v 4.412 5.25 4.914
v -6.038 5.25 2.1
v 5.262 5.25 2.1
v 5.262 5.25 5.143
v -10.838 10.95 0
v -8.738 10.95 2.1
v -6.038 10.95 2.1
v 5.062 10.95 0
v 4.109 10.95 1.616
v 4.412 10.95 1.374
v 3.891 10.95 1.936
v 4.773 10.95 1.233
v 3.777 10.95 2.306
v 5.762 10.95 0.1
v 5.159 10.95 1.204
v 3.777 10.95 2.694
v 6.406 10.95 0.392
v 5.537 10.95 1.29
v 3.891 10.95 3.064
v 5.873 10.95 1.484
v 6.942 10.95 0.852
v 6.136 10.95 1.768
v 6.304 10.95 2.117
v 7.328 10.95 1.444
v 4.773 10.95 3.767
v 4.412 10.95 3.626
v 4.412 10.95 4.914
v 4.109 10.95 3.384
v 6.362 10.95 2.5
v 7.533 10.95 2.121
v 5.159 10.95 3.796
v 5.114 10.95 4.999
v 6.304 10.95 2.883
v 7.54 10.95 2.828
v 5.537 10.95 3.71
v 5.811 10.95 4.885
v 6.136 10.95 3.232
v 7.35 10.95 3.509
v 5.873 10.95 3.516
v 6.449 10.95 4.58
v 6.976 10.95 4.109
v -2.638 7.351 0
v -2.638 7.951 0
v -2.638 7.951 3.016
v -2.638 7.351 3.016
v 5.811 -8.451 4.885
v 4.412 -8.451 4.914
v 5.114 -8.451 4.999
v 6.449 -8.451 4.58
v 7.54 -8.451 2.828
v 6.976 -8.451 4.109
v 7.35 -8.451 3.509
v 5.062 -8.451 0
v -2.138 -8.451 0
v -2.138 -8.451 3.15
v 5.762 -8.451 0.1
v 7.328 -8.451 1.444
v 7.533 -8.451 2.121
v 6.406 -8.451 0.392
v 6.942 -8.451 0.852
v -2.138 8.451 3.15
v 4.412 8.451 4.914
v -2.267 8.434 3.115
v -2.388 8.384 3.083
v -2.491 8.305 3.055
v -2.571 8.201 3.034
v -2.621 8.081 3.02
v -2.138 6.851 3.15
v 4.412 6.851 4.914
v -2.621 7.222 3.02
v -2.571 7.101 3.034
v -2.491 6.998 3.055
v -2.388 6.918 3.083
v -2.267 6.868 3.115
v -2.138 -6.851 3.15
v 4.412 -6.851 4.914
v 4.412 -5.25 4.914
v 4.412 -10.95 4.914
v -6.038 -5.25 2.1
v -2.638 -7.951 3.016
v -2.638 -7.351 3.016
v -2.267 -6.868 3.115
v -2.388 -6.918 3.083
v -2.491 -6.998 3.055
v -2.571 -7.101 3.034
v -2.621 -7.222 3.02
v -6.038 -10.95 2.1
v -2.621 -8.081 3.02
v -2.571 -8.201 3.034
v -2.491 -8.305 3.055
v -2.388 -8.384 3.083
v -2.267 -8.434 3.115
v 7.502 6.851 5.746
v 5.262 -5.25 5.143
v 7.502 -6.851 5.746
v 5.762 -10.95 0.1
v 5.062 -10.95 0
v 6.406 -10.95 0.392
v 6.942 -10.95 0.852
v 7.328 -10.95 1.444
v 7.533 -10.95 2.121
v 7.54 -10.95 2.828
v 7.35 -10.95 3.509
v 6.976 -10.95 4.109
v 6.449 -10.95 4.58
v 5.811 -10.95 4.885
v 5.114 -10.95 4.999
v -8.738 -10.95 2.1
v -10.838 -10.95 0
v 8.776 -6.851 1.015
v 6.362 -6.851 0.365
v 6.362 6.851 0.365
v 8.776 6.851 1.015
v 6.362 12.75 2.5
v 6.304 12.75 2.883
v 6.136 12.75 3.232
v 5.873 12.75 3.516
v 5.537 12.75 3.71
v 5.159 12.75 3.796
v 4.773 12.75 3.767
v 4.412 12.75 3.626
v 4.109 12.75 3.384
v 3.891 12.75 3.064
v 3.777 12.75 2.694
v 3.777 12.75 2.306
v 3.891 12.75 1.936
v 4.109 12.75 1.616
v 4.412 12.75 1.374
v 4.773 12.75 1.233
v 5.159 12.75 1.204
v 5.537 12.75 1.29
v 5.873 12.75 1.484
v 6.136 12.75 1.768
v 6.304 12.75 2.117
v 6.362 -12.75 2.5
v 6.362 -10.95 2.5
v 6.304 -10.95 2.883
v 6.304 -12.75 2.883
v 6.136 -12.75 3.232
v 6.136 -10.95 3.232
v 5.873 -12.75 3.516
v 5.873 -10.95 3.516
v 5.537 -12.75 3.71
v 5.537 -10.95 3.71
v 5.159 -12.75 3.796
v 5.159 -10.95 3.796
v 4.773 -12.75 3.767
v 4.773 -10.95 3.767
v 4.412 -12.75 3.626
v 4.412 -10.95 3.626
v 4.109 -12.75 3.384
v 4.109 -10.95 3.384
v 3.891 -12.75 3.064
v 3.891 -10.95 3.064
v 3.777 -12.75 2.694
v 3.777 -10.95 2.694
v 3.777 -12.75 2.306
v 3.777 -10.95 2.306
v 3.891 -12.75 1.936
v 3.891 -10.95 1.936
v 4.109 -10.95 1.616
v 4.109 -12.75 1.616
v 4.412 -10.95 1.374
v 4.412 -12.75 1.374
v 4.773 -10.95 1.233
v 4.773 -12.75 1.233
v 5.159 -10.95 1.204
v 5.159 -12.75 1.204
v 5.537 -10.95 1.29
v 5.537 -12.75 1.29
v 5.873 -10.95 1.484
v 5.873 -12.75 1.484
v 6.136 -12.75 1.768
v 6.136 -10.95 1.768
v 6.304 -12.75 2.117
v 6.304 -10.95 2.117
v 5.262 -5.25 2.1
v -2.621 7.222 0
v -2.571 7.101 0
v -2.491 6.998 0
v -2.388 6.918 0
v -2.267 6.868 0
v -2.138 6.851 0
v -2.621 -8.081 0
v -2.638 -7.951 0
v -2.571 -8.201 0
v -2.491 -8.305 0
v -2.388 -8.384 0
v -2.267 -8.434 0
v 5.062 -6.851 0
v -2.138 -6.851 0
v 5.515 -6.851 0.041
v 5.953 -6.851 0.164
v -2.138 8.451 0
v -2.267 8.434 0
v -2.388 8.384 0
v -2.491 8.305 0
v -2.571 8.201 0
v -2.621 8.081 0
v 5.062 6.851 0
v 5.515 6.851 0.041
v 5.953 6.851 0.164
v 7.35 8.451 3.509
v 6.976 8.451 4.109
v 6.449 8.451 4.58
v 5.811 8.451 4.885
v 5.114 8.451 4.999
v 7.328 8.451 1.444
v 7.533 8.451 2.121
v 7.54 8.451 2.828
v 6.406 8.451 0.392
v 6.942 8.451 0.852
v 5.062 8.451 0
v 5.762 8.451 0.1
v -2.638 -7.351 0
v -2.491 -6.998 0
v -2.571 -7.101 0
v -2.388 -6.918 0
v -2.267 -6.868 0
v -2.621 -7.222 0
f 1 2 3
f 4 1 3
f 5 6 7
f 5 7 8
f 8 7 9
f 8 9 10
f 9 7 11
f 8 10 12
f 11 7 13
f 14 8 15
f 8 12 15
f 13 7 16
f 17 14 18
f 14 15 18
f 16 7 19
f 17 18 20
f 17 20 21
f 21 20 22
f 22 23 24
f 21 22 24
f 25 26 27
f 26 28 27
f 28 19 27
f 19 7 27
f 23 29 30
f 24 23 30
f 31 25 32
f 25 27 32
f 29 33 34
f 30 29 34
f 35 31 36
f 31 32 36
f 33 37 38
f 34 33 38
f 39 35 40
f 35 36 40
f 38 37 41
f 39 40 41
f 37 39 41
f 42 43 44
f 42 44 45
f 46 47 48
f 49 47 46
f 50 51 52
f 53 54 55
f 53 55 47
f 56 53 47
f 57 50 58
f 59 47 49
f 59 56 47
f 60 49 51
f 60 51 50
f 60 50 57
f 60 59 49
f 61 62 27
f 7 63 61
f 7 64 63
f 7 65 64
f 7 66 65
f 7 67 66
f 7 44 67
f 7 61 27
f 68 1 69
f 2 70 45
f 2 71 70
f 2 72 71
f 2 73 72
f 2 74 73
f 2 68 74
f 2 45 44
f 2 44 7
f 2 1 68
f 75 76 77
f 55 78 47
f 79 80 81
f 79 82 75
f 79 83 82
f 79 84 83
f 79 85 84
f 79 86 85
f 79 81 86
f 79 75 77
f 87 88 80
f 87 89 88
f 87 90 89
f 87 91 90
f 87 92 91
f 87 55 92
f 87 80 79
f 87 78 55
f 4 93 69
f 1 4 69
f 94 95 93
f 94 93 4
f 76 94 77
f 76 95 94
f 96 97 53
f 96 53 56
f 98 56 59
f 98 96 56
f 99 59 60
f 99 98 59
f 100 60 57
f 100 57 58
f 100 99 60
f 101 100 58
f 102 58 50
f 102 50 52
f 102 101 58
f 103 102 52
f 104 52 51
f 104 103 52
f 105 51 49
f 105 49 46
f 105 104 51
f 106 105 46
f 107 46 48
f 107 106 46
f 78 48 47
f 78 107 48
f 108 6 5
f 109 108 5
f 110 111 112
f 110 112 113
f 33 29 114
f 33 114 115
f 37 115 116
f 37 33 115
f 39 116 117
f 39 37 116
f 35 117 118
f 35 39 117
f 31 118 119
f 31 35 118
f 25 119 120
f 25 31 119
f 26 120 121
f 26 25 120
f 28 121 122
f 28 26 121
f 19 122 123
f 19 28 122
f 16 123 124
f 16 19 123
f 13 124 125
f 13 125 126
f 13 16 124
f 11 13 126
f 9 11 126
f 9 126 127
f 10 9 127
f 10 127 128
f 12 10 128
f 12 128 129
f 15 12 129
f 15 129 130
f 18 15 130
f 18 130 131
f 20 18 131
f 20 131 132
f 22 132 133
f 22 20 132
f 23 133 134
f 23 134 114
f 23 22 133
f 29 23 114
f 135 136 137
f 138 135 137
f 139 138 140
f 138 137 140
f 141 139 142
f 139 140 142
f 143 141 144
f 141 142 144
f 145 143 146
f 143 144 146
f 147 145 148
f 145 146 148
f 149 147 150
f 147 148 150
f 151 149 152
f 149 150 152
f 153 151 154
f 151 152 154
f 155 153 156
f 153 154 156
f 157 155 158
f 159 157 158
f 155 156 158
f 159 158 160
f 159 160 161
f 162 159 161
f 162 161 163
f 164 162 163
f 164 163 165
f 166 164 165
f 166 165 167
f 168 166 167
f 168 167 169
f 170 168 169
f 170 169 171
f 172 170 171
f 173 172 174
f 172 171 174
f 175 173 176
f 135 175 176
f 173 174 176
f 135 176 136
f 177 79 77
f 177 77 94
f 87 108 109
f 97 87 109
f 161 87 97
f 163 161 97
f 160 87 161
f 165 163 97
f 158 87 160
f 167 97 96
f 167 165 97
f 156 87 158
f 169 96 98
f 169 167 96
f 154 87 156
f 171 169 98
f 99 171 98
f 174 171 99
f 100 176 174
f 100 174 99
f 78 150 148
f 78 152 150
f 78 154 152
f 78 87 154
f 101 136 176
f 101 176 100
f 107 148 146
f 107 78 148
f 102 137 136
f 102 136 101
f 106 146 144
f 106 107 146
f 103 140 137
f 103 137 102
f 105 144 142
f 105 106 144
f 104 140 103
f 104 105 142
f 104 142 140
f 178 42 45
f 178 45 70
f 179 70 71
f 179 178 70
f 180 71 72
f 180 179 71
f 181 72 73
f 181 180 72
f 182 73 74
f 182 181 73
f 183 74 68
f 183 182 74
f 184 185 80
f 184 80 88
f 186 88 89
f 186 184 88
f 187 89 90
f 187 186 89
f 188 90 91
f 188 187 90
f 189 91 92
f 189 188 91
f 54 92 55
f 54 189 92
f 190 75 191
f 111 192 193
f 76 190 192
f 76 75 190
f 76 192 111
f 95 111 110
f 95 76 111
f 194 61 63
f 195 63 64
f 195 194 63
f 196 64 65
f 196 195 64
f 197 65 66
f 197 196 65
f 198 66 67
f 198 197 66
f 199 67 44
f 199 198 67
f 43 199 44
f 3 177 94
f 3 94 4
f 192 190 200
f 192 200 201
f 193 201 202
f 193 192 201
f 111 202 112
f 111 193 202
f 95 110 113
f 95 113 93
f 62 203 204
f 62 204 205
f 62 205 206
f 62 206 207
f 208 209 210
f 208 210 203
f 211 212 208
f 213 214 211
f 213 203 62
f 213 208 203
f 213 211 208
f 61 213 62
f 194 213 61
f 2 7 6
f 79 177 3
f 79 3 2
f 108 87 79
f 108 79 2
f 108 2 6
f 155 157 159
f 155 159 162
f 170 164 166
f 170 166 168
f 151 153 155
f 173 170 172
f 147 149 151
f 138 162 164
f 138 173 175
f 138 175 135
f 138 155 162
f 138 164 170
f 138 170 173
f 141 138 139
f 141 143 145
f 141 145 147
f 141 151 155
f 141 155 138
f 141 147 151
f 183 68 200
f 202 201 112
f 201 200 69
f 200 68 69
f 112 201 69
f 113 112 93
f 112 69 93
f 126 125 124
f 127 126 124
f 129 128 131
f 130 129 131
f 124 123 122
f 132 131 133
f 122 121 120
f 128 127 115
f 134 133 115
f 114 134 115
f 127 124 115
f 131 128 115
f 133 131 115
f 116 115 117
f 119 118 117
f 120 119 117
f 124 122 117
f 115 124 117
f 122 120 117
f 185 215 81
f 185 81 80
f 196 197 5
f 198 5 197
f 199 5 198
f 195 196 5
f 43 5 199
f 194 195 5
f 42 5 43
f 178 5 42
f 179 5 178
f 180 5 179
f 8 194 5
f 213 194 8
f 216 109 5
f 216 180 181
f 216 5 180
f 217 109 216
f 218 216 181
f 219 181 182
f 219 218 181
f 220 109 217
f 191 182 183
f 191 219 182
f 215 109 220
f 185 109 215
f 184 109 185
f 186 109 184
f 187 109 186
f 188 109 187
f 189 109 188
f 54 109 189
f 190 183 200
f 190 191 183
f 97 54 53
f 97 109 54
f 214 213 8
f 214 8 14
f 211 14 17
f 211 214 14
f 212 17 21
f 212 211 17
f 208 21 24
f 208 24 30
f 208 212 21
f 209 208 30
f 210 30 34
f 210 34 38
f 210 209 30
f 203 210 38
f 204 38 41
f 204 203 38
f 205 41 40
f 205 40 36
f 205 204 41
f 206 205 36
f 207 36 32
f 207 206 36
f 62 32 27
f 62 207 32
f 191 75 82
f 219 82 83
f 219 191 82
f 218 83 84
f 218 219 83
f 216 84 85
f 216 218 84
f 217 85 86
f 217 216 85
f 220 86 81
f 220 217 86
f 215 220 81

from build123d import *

# Parameters (mm, degrees)
F1_DEPTH  = 10.95
F2_R      = 1.3
F3_DEPTH  = 1.8
F6_DEPTH  = 5.001
F8_DEPTH  = 13.702198
F9_W      = 11.3
F9_H      = 10.5
F10_DEPTH = 3.647076


with BuildPart() as f1:
    # F0 (on Front) → F1 (new body, symmetric)
    with BuildSketch(Plane.XZ):
        with BuildLine():
            Line((-8.737945, 2.1), (-10.837945, 0))
            Line((-10.837945, 0), (5.062055, 0))
            ThreePointArc((5.062055, 0), (7.540463, 2.827859), (4.412, 4.914007))
            Line((4.412, 4.914007), (-6.037945, 2.1))
            Line((-6.037945, 2.1), (-8.737945, 2.1))
        make_face()
    extrude(amount=F1_DEPTH, both=True)

    # F2 (on face) → F3 (join)
    with BuildSketch(Plane.XZ.offset(10.95)):
        with Locations((5.062055, 2.5)):
            Circle(F2_R)
    extrude(amount=F3_DEPTH)

    # F4: F1 across plane


with BuildPart() as f1_1:
    add(f1.part)
    add(f1.part.mirror(Plane.XZ))

    # F5 (on Top) → F6 (cut, through all)
    with BuildSketch(Plane.XY):
        with BuildLine():
            Line((9.362055, 8.451099), (-2.137945, 8.451099))
            ThreePointArc((-2.137945, 8.451099), (-2.491499, 8.304652), (-2.637945, 7.951099))
            Line((-2.637945, 7.951099), (-2.637945, 7.351099))
            ThreePointArc((-2.637945, 7.351099), (-2.491499, 6.997546), (-2.137945, 6.851099))
            Line((-2.137945, 6.851099), (9.362055, 6.851099))
            Line((9.362055, 6.851099), (9.362055, 8.451099))
        make_face()
        with BuildLine():
            Line((9.362055, -8.451099), (9.362055, -6.851099))
            Line((9.362055, -6.851099), (-2.137945, -6.851099))
            ThreePointArc((-2.137945, -6.851099), (-2.491499, -6.997546), (-2.637945, -7.351099))
            Line((-2.637945, -7.351099), (-2.637945, -7.951099))
            ThreePointArc((-2.637945, -7.951099), (-2.491499, -8.304652), (-2.137945, -8.451099))
            Line((-2.137945, -8.451099), (9.362055, -8.451099))
        make_face()
    extrude(amount=F6_DEPTH, mode=Mode.SUBTRACT)

    # F7 (on face) → F8 (join, through all)
    with BuildSketch(Plane.XZ.offset(6.851099)):
        with BuildLine():
            Line((7.501929, 5.746076), (4.412, 4.914007))
            ThreePointArc((4.412, 4.914007), (7.359868, 3.484913), (6.362029, 0.364569))
            Line((6.362029, 0.364569), (8.776036, 1.014623))
            Line((8.776036, 1.014623), (7.501929, 5.746076))
        make_face()
    extrude(amount=-F8_DEPTH)

    # F9 (on face) → F10 (cut, through all)
    with BuildSketch(Plane.XY.offset(2.1)):
        with Locations((-0.387945, 0)):
            Rectangle(F9_W, F9_H)
    extrude(amount=F10_DEPTH, mode=Mode.SUBTRACT)


solid = f1_1.part
